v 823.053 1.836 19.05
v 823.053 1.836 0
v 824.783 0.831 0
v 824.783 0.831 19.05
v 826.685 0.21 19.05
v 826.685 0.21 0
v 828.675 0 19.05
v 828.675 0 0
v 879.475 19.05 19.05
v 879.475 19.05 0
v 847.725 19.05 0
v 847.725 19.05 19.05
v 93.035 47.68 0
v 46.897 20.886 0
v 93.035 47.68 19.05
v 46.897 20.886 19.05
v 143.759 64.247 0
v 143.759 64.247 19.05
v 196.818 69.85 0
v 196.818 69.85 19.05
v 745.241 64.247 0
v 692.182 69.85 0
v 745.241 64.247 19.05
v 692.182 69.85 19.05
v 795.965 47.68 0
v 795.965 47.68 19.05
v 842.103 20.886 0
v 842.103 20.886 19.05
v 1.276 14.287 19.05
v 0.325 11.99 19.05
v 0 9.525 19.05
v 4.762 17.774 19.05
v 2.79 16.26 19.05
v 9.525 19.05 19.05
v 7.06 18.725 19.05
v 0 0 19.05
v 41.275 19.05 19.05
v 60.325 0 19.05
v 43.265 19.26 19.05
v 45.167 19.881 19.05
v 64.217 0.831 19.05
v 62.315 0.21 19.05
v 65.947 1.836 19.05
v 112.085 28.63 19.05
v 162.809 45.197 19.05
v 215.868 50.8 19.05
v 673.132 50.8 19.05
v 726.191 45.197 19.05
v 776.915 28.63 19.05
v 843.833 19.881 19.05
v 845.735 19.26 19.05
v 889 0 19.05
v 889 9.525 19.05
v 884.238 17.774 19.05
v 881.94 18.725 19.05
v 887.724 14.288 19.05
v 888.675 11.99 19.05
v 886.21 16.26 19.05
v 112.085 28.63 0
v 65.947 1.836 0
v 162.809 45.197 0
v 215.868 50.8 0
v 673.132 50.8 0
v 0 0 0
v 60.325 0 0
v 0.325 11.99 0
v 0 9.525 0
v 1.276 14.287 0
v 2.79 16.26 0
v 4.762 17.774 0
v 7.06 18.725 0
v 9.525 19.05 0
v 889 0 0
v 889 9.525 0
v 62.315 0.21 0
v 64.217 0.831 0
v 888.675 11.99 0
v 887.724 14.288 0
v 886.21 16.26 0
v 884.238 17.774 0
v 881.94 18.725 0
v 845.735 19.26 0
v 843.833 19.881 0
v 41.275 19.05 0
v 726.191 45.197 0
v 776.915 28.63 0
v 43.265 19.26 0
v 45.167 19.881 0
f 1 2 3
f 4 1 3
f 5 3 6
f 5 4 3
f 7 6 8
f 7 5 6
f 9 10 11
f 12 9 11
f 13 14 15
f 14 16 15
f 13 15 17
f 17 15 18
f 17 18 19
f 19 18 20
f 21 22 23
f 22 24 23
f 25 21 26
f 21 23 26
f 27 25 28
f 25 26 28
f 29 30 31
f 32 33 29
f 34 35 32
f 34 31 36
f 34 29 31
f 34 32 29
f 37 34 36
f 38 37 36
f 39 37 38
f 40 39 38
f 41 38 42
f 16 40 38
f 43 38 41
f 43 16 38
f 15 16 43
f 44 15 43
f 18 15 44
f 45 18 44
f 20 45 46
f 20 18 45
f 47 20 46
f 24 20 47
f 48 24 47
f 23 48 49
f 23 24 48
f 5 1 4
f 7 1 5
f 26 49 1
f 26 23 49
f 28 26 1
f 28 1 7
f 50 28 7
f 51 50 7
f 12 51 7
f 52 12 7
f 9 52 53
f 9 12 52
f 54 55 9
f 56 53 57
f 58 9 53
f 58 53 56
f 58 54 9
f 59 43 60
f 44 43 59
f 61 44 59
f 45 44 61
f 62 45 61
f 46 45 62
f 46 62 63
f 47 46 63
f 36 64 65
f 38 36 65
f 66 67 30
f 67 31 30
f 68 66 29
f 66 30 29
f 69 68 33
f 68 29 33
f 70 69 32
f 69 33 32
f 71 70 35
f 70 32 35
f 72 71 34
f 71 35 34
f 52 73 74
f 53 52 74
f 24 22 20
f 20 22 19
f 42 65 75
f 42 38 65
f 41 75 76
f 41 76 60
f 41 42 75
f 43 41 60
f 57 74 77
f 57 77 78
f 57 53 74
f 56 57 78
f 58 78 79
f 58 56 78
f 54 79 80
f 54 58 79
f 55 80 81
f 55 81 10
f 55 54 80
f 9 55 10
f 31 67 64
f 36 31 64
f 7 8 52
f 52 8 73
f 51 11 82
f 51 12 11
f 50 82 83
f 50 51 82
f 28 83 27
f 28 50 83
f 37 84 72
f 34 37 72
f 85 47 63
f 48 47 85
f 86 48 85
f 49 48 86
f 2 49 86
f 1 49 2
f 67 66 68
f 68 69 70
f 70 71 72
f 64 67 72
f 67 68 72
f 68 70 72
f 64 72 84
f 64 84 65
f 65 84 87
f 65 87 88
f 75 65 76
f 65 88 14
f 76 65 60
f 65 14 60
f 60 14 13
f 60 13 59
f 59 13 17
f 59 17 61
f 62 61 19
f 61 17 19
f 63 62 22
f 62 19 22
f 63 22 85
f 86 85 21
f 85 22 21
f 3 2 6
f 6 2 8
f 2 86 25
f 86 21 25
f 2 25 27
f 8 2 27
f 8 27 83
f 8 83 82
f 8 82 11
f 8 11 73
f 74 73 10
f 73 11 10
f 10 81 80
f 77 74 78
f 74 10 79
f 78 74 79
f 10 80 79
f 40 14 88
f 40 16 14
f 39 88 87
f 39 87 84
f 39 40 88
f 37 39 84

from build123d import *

# Parameters (mm, degrees)
F3_DEPTH = 19.05
F4_R     = 9.525
F5_R     = 254


# Not quite as in the source:
# - a variable given as a bare number and used for a length is read in inches; the dataset says mm whatever the document's units were


with BuildPart() as f3:
    # F2 (on Top) → F3 (new body)
    with BuildSketch(Plane.XY):
        Polygon((0, 19.05), (0, 0), (69.85, 0), (69.85, 50.8), (444.5, 50.8), (819.15, 50.8), (819.15, 0), (889, 0), (889, 19.05), (838.2, 19.05), (838.2, 69.85), (444.5, 69.85), (50.8, 69.85), (50.8, 19.05), align=None)
    extrude(amount=F3_DEPTH)

    # F4
    f4_edges = [f3.edges().sort_by_distance(p)[0] for p in [
        (69.85, 0, 9.525),
        (50.8, 19.05, 9.525),
        (819.15, 0, 9.525),
        (838.2, 19.05, 9.525),
        (0, 19.05, 9.525),
        (889, 19.05, 9.525),
    ]]
    fillet(f4_edges, radius=F4_R)

    # F5
    f5_edges = [f3.edges().sort_by_distance(p)[0] for p in [
        (69.85, 50.8, 9.525),
        (50.8, 69.85, 9.525),
        (819.15, 50.8, 9.525),
        (838.2, 69.85, 9.525),
    ]]
    fillet(f5_edges, radius=F5_R)


solid = f3.part
